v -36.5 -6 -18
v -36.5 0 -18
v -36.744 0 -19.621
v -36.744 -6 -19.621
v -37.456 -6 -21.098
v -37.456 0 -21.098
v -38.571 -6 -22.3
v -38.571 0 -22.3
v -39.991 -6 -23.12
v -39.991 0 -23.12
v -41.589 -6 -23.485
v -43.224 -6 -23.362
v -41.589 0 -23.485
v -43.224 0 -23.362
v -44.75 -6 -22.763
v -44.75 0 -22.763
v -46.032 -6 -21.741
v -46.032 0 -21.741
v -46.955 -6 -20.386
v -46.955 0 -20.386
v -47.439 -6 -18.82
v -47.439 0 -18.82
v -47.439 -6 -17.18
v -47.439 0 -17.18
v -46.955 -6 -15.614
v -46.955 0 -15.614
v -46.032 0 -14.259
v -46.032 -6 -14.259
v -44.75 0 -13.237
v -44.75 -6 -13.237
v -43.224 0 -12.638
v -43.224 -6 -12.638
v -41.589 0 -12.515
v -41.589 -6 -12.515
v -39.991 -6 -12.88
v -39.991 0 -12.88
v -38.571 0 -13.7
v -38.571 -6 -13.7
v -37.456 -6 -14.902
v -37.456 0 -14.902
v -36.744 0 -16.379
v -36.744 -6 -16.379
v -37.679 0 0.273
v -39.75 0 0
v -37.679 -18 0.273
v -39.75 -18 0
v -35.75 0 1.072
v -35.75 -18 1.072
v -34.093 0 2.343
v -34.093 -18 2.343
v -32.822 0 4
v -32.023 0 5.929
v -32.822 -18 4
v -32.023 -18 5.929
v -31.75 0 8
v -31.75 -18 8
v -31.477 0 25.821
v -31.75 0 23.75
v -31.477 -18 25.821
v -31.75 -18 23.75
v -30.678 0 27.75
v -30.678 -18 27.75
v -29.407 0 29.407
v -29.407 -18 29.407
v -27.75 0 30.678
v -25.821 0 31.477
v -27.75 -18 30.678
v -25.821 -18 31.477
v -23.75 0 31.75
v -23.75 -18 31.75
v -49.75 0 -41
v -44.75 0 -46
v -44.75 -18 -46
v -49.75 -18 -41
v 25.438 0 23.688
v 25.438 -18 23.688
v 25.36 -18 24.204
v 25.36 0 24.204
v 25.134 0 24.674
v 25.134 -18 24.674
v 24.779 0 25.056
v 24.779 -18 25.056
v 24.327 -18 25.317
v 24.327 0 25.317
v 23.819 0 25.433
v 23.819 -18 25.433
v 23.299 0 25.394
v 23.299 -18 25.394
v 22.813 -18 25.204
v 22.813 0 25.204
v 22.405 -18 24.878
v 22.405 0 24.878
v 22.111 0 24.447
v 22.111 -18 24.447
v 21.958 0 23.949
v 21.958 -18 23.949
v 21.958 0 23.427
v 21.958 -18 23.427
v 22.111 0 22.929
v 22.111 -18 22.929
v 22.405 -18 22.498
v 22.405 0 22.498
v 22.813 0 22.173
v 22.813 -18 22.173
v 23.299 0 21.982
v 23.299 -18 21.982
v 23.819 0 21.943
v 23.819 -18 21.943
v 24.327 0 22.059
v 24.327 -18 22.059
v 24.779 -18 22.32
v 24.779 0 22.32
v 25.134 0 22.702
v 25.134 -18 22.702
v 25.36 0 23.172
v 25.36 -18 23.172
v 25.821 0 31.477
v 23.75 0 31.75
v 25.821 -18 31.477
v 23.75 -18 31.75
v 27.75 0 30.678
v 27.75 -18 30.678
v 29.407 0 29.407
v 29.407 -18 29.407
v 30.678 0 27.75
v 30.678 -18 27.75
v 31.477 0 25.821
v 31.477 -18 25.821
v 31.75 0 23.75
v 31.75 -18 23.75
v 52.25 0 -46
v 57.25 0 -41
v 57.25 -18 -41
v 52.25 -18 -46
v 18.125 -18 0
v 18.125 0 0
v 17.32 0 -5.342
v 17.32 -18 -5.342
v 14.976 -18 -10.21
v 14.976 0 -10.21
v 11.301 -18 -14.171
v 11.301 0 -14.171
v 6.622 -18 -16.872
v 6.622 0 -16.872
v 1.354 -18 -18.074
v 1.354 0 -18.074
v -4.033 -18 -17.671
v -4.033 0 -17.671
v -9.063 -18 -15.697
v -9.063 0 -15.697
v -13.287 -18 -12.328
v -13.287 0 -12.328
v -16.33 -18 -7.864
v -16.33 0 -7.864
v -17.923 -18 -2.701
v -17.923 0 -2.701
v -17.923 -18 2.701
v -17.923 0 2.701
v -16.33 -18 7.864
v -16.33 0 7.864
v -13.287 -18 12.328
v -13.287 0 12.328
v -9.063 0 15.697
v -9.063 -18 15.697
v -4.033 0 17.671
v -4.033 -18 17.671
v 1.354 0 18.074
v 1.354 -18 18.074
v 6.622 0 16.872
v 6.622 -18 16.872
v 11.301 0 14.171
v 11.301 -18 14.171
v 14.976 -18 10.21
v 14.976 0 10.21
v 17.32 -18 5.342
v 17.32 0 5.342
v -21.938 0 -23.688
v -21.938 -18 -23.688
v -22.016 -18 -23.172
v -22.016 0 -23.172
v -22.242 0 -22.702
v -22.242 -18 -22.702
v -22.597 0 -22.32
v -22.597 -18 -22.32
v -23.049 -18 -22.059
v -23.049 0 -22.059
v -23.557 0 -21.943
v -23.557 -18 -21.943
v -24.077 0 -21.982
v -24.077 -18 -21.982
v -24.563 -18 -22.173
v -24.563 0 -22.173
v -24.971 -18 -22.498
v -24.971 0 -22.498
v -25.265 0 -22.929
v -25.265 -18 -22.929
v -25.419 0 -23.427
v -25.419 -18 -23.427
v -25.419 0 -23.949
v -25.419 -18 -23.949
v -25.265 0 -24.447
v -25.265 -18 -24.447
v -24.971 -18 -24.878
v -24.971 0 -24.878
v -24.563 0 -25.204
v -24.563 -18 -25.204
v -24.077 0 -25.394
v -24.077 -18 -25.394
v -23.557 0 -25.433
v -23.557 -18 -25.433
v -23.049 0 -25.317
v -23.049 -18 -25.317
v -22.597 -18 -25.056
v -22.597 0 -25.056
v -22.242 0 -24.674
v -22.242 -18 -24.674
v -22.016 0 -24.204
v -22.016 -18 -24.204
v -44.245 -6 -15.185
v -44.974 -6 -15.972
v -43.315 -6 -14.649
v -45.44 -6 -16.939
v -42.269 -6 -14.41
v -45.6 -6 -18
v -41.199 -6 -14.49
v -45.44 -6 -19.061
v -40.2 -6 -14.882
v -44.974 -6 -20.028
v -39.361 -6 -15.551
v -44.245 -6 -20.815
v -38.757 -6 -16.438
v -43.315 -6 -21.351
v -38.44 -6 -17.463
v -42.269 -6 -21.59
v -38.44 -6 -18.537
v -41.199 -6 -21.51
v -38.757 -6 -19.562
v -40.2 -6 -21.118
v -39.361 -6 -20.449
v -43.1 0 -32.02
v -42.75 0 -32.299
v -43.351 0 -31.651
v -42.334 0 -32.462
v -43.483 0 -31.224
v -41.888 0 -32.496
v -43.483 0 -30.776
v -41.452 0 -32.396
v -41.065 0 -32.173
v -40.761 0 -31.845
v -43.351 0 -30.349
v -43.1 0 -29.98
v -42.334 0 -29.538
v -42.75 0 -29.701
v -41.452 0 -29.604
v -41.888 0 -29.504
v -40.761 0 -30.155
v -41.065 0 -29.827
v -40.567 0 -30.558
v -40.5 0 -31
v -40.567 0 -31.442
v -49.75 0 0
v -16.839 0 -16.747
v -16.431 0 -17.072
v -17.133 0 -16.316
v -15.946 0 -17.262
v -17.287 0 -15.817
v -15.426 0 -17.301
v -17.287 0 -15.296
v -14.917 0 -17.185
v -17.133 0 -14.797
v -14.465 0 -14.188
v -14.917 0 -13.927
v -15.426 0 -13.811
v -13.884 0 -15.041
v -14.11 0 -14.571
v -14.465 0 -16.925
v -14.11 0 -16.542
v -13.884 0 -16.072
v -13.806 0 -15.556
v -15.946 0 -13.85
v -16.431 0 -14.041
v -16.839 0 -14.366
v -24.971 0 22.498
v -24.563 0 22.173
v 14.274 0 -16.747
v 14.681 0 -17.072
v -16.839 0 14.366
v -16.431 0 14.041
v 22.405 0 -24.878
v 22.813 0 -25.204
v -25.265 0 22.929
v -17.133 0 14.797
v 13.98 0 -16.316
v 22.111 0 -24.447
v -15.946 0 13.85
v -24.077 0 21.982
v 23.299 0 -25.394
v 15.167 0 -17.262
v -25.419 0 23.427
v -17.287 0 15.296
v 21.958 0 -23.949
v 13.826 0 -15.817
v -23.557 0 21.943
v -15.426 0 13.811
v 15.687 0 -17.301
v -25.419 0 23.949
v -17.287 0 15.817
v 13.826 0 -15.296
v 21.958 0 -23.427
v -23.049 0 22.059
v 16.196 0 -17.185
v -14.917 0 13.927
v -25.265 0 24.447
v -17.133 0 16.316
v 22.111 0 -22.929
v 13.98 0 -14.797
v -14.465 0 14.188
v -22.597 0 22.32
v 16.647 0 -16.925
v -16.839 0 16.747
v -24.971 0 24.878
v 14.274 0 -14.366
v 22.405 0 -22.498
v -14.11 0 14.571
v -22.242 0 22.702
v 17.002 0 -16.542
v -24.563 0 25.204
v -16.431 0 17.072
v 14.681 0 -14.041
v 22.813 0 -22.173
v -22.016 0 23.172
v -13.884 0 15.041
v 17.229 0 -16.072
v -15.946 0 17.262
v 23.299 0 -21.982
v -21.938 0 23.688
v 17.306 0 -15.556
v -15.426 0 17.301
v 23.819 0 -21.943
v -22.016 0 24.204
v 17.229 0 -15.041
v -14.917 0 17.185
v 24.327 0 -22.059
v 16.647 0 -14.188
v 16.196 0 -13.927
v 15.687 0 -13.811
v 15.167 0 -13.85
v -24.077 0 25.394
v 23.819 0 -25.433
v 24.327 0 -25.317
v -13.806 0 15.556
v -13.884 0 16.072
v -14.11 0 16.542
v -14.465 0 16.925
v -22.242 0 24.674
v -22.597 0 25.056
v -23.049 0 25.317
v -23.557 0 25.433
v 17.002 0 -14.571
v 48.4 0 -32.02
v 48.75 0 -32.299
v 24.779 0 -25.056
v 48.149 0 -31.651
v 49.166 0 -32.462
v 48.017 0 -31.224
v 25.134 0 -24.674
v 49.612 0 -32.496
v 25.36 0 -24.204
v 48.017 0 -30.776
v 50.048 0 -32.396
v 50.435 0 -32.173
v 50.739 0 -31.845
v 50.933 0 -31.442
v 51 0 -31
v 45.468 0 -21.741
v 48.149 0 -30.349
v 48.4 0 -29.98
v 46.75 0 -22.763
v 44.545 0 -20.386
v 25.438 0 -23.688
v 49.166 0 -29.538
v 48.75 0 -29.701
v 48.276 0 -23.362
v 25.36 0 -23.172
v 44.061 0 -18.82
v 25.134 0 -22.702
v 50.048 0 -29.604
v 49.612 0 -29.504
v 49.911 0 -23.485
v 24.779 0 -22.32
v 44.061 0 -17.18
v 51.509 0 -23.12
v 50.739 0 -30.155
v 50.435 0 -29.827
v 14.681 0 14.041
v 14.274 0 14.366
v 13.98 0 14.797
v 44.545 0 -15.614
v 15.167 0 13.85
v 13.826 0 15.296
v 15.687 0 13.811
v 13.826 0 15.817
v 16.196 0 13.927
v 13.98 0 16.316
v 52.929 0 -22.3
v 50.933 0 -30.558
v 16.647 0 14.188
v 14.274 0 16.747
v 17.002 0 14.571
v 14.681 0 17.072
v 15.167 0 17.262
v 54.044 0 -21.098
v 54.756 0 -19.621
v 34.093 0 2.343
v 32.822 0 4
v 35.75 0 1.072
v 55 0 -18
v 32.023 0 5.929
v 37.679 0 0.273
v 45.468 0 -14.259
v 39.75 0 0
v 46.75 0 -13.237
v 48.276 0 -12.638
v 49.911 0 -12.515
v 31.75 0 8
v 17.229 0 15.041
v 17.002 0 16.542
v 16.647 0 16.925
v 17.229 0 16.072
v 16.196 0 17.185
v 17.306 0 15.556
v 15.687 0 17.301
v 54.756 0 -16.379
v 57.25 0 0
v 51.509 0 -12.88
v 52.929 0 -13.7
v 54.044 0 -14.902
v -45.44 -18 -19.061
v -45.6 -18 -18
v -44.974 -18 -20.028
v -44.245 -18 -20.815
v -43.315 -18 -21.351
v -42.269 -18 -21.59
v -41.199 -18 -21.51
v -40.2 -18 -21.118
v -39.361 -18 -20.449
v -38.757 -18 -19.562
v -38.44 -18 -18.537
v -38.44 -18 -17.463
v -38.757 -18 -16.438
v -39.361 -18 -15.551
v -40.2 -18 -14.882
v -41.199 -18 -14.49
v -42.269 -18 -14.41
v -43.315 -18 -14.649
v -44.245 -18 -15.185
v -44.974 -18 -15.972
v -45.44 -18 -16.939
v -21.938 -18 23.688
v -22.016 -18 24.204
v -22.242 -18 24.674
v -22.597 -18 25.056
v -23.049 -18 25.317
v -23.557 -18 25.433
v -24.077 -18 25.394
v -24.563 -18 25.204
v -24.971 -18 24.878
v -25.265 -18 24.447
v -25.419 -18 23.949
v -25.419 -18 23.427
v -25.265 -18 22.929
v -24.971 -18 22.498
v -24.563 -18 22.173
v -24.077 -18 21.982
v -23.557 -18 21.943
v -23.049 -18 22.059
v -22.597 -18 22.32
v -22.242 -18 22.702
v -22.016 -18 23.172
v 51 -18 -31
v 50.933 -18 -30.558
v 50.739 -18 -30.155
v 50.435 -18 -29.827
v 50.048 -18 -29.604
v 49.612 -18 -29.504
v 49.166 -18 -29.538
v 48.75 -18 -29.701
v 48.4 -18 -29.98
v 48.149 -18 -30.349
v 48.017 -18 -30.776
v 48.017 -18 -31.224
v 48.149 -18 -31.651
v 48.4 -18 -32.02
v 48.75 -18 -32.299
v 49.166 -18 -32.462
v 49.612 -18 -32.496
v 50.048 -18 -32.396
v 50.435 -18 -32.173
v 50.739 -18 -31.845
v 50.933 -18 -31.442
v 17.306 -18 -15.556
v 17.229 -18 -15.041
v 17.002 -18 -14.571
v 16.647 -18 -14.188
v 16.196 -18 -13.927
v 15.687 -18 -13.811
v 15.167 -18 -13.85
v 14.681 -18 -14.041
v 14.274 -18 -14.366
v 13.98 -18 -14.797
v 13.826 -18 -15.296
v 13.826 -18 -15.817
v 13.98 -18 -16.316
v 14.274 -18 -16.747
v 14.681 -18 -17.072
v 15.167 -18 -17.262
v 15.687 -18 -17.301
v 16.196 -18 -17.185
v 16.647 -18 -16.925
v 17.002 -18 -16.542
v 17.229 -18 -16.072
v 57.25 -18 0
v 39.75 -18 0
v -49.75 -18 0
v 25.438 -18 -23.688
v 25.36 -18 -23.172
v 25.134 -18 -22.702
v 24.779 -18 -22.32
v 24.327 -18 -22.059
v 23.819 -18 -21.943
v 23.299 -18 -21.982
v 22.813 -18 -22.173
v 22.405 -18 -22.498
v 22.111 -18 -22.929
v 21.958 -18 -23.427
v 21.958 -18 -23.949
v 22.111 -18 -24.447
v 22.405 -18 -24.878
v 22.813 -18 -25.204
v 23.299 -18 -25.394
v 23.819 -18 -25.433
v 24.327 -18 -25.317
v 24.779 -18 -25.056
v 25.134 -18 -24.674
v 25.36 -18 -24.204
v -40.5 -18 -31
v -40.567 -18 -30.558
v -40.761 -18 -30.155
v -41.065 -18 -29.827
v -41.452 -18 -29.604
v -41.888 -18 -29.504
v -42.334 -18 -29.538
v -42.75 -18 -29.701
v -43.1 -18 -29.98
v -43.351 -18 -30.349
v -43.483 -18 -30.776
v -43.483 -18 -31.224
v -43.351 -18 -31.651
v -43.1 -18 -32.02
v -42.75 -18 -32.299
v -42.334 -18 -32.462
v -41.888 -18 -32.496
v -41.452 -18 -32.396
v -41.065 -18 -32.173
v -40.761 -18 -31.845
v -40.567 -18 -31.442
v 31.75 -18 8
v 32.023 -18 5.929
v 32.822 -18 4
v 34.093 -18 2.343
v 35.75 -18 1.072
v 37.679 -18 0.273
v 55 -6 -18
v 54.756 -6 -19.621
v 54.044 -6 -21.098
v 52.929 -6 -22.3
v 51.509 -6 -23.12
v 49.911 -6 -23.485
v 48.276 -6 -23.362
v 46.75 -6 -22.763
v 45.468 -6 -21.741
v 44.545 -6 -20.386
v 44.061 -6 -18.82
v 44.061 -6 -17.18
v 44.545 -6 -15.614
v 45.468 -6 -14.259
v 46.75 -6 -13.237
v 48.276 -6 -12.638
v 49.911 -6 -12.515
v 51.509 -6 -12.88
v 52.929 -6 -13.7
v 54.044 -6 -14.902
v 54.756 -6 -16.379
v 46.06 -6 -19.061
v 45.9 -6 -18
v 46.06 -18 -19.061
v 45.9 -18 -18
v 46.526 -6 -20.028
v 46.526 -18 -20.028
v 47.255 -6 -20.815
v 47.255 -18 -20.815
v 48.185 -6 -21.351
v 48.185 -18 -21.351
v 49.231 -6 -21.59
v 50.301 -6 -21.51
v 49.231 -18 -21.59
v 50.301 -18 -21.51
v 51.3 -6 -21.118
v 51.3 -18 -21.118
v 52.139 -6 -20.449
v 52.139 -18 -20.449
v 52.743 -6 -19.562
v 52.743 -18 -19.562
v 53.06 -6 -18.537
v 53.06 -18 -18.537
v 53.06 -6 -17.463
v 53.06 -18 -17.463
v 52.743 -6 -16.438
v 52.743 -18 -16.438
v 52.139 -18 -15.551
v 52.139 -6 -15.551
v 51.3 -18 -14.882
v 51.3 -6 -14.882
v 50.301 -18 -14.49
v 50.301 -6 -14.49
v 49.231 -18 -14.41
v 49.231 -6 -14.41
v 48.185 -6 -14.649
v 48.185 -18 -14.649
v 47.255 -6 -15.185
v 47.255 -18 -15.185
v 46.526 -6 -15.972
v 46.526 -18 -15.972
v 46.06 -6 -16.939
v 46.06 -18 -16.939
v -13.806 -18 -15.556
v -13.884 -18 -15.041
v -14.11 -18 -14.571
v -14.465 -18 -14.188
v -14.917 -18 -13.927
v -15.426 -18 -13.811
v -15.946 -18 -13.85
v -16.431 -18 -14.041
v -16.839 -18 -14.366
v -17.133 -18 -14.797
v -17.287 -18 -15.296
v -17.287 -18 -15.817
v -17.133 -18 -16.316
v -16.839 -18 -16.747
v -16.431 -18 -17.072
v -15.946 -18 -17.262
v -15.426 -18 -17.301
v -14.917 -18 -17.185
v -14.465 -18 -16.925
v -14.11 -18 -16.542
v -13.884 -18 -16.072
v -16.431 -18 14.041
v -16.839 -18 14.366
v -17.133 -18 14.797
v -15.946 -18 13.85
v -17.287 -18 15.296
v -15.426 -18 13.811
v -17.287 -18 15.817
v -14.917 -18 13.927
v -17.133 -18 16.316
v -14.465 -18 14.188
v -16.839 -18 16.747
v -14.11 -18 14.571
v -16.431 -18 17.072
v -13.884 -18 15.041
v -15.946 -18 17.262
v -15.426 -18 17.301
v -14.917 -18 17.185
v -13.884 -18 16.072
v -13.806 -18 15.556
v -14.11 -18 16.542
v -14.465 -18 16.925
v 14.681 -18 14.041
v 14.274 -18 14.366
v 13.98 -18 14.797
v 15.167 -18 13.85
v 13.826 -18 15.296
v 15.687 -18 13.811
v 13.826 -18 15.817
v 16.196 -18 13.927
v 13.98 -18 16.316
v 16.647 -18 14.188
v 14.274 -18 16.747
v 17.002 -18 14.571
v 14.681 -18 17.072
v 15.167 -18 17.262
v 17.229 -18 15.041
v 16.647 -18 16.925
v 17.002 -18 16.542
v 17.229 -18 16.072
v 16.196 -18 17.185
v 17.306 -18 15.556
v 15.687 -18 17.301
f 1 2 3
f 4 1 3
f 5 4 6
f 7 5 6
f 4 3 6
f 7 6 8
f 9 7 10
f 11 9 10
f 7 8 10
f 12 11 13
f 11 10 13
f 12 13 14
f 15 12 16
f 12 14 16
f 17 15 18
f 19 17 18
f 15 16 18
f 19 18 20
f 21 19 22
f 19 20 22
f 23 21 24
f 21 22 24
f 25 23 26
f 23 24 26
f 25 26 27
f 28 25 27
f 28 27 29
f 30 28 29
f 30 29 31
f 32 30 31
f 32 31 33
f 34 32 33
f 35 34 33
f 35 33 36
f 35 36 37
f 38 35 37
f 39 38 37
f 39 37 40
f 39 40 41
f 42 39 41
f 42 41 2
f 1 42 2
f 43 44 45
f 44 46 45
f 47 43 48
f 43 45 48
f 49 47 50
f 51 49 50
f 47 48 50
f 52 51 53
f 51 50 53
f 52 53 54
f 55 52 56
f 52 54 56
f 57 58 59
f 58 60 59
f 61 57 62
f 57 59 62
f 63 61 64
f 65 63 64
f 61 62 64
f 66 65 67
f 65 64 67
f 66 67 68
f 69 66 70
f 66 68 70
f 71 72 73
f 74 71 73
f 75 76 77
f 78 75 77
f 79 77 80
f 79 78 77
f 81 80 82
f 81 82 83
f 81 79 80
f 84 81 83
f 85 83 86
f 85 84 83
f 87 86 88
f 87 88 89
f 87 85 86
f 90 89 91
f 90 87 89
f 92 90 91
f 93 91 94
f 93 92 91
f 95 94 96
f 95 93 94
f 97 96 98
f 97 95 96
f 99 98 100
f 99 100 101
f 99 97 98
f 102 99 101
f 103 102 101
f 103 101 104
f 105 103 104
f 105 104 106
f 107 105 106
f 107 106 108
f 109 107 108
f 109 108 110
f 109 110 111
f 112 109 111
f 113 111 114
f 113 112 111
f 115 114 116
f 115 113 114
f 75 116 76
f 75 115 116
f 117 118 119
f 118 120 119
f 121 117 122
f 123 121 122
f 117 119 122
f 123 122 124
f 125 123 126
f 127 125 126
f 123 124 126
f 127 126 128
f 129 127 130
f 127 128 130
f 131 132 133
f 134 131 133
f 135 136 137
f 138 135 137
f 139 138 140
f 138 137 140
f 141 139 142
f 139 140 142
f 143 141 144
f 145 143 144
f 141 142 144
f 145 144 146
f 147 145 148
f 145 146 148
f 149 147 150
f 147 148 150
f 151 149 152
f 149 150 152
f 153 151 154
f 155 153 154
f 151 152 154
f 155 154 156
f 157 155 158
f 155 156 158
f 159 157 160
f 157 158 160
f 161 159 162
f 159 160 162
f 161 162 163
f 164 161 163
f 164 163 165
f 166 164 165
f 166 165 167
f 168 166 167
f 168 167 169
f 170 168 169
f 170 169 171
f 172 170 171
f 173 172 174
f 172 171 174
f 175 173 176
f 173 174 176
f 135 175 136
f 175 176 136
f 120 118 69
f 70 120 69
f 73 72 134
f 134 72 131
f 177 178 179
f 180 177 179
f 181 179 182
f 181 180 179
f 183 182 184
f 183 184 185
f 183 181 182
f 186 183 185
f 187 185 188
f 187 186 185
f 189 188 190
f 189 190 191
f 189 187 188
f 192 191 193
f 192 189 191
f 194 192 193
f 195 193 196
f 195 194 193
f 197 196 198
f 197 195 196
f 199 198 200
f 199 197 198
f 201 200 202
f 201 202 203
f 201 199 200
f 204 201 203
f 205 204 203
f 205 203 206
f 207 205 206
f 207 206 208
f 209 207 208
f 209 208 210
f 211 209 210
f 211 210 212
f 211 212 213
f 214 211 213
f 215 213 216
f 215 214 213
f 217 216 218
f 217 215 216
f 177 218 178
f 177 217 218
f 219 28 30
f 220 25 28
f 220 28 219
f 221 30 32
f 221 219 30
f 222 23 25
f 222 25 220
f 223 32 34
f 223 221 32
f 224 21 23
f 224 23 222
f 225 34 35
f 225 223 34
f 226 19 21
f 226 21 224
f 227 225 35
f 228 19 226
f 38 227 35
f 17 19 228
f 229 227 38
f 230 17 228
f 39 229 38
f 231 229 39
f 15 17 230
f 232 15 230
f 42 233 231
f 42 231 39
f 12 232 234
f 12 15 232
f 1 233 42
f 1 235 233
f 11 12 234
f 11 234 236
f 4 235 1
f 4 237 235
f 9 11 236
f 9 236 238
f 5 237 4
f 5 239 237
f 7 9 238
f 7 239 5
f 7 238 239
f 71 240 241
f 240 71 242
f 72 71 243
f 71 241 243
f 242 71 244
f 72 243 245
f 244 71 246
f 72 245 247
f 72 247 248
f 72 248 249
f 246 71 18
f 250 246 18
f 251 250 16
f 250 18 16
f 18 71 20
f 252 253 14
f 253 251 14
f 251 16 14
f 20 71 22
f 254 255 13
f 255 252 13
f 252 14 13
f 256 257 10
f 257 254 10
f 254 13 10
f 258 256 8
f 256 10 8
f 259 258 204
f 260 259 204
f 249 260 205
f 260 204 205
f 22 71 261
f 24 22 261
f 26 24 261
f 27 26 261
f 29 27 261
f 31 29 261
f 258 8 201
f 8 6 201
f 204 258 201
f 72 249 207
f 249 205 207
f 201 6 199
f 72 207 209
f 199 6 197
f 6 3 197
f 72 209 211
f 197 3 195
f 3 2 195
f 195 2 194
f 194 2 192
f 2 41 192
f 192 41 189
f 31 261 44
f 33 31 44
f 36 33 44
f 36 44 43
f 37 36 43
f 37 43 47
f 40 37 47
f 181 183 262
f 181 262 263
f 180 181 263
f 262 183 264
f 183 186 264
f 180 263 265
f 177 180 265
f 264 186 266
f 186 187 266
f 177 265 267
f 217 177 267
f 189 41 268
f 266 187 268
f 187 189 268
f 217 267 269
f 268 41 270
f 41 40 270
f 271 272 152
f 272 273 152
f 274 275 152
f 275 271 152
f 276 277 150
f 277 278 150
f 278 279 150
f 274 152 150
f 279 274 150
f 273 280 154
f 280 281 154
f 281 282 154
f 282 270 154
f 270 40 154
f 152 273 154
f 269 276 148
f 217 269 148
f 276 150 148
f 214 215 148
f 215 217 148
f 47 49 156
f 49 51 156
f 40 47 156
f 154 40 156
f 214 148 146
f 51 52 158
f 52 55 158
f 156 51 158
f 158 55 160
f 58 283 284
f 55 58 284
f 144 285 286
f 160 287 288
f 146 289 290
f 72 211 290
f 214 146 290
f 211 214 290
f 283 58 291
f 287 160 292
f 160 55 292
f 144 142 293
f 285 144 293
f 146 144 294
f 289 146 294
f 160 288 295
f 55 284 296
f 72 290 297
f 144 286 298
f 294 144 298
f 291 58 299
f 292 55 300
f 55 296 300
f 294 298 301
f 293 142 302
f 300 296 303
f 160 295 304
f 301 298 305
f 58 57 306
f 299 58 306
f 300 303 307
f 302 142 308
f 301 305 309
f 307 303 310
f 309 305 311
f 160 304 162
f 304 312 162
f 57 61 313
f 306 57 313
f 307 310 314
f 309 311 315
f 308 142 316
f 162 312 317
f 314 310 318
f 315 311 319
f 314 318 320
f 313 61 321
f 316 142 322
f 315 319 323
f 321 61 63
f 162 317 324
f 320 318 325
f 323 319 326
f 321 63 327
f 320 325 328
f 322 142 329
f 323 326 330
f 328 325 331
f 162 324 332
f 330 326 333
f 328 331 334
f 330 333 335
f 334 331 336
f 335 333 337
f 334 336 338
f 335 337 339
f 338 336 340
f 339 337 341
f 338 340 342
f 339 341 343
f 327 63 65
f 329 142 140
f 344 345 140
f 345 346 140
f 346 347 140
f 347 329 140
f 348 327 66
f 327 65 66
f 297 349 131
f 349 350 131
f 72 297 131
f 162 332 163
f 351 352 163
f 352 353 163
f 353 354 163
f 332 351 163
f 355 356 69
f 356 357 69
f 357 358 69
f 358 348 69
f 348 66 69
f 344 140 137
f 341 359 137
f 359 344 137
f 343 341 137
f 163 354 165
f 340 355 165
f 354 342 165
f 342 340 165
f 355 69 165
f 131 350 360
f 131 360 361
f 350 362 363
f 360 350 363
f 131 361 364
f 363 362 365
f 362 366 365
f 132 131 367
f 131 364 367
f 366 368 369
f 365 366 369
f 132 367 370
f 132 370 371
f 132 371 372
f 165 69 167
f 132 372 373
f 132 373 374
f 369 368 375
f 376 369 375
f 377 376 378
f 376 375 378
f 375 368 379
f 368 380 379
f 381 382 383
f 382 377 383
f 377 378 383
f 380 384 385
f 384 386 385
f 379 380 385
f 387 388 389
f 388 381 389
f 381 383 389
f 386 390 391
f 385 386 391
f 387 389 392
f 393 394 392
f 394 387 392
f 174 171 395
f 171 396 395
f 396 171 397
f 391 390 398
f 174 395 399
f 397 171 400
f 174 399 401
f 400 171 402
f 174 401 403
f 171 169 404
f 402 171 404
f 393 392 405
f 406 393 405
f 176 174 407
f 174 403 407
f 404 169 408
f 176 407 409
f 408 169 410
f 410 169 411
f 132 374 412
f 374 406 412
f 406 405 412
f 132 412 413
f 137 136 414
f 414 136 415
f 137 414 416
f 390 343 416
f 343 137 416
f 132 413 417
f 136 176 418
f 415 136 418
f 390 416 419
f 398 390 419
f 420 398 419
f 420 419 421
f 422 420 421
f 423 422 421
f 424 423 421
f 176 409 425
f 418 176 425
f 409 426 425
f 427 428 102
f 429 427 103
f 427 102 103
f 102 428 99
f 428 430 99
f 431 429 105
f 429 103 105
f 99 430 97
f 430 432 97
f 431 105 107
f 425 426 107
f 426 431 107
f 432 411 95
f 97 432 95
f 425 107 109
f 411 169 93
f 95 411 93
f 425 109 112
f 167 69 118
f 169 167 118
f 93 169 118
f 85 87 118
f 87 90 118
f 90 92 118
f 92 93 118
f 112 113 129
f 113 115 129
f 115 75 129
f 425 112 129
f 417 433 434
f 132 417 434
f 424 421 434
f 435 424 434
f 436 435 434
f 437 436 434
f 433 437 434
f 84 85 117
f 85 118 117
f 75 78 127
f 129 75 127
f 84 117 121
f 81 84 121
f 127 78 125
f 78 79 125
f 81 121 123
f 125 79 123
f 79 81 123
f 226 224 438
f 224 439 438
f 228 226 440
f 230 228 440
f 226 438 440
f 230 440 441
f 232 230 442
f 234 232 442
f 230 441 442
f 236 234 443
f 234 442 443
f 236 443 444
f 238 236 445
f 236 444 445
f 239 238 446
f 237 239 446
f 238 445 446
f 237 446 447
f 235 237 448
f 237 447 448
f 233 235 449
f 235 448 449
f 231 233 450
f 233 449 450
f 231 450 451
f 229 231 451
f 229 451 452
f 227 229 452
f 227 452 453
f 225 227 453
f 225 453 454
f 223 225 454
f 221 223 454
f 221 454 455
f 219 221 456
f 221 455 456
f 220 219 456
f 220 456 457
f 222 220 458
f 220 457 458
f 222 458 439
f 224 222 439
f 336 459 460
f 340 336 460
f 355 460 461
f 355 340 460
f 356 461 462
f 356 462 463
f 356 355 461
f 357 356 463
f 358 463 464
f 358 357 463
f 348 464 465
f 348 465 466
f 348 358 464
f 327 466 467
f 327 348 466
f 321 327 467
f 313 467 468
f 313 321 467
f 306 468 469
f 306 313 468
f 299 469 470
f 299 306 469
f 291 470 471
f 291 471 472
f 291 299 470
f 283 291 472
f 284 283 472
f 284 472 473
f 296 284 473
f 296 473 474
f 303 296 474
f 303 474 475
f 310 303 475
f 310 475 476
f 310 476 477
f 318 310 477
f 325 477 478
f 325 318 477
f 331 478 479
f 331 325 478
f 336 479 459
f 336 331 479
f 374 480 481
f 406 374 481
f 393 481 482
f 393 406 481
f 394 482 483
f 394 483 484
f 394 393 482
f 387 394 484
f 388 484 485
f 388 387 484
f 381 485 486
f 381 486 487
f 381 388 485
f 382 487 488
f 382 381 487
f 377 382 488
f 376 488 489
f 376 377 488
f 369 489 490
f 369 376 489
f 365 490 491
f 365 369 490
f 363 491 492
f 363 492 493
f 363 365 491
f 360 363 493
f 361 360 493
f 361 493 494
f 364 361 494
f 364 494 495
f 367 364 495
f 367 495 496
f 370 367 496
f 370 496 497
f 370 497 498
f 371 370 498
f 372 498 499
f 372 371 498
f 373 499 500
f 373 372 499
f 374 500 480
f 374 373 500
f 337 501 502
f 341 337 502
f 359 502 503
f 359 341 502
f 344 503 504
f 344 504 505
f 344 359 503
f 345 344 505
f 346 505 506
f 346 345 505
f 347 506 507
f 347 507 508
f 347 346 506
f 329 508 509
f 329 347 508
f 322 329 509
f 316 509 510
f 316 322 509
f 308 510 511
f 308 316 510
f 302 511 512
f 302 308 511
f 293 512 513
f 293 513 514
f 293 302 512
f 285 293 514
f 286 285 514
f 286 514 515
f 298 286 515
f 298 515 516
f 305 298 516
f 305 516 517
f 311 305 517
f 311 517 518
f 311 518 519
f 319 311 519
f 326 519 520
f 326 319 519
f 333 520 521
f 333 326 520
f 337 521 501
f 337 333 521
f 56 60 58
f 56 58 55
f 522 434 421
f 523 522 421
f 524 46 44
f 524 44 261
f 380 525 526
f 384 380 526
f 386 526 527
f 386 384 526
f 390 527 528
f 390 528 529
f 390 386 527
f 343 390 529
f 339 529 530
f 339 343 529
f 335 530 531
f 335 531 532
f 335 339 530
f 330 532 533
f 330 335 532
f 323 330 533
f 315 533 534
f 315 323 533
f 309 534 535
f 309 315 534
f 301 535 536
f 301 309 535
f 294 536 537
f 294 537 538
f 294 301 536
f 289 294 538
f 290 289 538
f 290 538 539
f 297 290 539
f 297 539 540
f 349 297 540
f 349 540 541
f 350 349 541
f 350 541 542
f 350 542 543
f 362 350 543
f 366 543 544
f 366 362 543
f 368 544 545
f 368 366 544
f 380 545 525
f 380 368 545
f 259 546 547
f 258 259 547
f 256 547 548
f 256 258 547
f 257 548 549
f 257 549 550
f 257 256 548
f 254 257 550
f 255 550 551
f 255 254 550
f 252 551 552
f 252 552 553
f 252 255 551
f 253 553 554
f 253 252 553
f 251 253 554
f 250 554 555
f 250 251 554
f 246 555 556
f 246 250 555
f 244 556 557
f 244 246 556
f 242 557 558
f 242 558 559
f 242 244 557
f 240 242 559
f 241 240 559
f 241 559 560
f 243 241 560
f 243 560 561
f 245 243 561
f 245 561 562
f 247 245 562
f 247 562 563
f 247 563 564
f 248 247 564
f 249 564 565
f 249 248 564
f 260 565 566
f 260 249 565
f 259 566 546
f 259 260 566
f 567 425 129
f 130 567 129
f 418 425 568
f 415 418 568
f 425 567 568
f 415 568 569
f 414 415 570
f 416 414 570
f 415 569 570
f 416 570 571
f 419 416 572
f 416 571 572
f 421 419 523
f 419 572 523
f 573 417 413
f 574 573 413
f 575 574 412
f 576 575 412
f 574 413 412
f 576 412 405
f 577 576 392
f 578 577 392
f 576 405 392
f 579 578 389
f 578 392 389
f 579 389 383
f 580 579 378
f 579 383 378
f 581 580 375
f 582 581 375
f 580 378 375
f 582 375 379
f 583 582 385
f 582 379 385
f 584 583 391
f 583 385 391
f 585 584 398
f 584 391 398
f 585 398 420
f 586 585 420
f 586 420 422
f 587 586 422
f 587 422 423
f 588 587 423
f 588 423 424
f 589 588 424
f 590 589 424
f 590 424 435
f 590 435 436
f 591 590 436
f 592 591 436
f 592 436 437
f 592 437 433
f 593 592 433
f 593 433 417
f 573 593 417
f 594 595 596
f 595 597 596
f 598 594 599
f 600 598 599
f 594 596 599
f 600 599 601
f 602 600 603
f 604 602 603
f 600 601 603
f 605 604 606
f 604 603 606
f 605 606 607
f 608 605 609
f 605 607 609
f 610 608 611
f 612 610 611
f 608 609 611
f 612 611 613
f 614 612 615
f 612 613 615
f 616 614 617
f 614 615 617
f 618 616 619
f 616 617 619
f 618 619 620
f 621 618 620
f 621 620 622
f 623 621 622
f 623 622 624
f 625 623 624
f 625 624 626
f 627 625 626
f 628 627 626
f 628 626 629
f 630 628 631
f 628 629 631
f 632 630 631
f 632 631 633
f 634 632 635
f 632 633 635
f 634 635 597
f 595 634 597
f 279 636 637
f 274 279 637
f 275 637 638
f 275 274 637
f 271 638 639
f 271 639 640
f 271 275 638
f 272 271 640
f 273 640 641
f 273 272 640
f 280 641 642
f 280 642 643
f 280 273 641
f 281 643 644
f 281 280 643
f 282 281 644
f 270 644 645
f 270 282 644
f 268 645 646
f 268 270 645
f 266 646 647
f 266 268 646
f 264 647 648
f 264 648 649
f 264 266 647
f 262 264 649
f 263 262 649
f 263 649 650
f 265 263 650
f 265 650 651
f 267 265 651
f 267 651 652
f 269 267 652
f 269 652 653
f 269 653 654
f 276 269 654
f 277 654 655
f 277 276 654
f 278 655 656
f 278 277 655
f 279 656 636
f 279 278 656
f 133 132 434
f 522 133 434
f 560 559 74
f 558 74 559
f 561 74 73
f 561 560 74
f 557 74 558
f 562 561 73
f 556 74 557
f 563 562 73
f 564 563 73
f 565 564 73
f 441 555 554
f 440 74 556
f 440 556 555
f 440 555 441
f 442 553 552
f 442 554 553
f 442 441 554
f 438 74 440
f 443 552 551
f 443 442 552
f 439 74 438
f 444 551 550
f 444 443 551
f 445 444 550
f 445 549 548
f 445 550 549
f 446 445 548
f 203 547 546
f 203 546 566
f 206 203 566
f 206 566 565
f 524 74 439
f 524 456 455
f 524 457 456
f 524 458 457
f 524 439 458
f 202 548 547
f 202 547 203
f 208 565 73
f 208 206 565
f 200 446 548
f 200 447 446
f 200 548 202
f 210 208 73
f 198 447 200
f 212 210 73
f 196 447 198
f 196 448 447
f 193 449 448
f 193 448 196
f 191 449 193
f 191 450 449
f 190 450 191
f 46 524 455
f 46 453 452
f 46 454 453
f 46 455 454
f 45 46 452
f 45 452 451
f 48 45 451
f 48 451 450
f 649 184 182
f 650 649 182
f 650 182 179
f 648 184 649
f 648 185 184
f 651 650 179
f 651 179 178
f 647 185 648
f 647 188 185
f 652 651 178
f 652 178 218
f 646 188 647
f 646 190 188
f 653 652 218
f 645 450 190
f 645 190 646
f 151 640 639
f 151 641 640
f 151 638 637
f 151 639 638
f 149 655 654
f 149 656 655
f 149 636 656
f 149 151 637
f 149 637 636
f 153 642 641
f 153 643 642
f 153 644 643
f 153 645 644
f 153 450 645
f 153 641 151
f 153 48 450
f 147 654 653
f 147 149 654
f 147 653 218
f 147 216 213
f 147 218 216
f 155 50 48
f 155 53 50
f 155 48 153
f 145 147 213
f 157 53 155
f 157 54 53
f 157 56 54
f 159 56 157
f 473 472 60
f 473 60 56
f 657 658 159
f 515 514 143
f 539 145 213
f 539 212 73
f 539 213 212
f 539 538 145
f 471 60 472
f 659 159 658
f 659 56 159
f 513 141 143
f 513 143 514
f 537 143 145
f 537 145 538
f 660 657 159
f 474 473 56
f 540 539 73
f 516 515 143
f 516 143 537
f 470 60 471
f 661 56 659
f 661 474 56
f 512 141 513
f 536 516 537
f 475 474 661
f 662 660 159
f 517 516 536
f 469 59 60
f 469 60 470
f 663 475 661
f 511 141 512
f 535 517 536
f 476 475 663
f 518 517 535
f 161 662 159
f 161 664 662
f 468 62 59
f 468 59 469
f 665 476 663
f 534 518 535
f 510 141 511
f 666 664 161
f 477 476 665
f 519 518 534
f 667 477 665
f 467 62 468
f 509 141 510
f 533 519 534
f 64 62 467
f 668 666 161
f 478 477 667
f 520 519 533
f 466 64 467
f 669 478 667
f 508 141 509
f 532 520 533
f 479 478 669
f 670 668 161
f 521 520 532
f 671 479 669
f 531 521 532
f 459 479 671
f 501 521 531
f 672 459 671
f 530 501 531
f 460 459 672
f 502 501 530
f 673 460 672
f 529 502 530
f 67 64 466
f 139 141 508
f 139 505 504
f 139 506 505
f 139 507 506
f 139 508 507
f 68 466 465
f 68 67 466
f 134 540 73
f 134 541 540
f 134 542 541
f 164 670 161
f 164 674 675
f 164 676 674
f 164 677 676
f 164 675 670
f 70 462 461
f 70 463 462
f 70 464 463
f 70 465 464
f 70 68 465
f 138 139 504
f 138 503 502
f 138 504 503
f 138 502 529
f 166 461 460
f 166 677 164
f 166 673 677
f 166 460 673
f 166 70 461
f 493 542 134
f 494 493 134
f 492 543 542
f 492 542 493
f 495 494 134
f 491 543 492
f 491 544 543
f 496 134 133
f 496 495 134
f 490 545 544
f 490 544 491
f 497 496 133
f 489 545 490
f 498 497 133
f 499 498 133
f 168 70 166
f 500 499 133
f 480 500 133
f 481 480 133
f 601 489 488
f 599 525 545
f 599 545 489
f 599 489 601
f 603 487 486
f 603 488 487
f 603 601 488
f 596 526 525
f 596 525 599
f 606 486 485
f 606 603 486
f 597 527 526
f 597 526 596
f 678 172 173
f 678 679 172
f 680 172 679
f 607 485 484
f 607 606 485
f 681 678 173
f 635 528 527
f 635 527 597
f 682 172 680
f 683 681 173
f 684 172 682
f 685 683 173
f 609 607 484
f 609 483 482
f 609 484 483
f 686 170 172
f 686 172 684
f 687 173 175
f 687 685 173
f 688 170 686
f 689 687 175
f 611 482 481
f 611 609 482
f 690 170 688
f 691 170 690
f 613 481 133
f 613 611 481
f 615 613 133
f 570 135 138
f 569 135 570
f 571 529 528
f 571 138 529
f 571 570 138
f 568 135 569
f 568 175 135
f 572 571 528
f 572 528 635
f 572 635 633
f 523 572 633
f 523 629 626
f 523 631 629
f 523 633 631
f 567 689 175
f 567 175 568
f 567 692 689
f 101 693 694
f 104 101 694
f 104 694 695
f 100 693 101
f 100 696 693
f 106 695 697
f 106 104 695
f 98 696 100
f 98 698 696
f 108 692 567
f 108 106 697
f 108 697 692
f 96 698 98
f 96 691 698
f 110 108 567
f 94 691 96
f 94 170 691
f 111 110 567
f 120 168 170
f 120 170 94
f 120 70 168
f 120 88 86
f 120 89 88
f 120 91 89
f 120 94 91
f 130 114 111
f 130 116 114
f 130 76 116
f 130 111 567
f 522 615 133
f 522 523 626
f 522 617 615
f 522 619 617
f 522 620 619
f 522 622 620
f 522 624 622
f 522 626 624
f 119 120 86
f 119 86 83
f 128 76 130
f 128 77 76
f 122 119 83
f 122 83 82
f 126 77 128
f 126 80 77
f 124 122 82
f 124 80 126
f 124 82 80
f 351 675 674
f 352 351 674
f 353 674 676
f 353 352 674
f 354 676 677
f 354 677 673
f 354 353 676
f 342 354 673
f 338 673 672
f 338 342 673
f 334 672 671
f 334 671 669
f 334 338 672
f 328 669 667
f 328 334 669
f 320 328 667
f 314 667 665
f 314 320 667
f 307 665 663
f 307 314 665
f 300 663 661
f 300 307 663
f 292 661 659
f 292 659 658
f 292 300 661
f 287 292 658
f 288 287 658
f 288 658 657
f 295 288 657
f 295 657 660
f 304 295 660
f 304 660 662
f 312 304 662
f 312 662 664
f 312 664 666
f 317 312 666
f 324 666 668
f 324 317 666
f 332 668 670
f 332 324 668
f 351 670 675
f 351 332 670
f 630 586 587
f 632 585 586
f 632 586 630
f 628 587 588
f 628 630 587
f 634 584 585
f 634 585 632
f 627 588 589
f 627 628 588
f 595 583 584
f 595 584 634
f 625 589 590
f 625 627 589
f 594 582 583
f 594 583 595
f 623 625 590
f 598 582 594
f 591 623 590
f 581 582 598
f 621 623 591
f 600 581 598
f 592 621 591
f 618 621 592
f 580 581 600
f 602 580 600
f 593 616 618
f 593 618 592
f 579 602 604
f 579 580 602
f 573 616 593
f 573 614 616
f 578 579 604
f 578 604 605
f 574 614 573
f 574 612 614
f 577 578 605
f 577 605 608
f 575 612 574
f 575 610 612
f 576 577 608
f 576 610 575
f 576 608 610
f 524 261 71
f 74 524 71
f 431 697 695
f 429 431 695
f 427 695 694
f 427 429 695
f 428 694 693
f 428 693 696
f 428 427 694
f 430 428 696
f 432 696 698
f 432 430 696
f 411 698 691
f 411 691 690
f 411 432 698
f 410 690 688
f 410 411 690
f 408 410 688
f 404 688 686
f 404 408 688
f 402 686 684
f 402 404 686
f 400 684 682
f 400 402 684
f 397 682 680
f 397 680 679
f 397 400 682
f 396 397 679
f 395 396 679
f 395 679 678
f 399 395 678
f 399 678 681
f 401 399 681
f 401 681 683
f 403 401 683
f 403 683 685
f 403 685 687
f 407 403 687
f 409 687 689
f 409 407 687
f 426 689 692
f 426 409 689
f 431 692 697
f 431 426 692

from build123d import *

# Parameters (mm, degrees)
F0_R           = 1.75
F0_R_2         = 1.5
F1_DEPTH       = 18
F2_SIZE        = 5
F3_R           = 8
F4_D           = 7.2
F4_DEPTH       = 35
F4_CBORE_D     = 11
F4_CBORE_DEPTH = 6
F4_TIP         = 2.1630982285


# Not quite as in the source:
# - a feature names something its author has since deleted; it is built from what else it names


with BuildPart() as f1:
    # F0 (on Front) → F1 (new body)
    with BuildSketch(Plane.XZ):
        with BuildLine():
            ThreePointArc((-18.125, 0), (0, 18.125), (18.125, 0))
            Line((18.125, 0), (31.75, 0))
            Line((31.75, 0), (31.75, 31.75))
            Line((31.75, 31.75), (-31.75, 31.75))
            Line((-31.75, 31.75), (-31.75, 0))
            Line((-31.75, 0), (-18.125, 0))
        make_face()
        with Locations((-23.6880771697, 23.6880771697)):
            Circle(F0_R, mode=Mode.SUBTRACT)
        with Locations((-15.5563491861, 15.5563491861)):
            Circle(F0_R, mode=Mode.SUBTRACT)
        with Locations((15.5563491861, 15.5563491861)):
            Circle(F0_R, mode=Mode.SUBTRACT)
        with Locations((23.6880771697, 23.6880771697)):
            Circle(F0_R, mode=Mode.SUBTRACT)
        with BuildLine():
            Line((31.75, 0), (18.125, 0))
            ThreePointArc((18.125, 0), (0, -18.125), (-18.125, 0))
            Line((-18.125, 0), (-31.75, 0))
            Line((-31.75, 0), (-31.75, -31.75))
            Line((-31.75, -31.75), (31.75, -31.75))
            Line((31.75, -31.75), (31.75, 0))
        make_face()
        with Locations((-23.6880771697, -23.6880771697)):
            Circle(F0_R, mode=Mode.SUBTRACT)
        with Locations((-15.5563491861, -15.5563491861)):
            Circle(F0_R, mode=Mode.SUBTRACT)
        with Locations((23.6880771697, -23.6880771697)):
            Circle(F0_R, mode=Mode.SUBTRACT)
        with Locations((15.5563491861, -15.5563491861)):
            Circle(F0_R, mode=Mode.SUBTRACT)
        Polygon((57.25, 0), (31.75, 0), (31.75, -31.75), (-31.75, -31.75), (-31.75, 0), (-49.75, 0), (-49.75, -46), (57.25, -46), align=None)
        with Locations((-42, -31)):
            Circle(F0_R_2, mode=Mode.SUBTRACT)
        with Locations((49.5, -31)):
            Circle(F0_R_2, mode=Mode.SUBTRACT)
    extrude(amount=F1_DEPTH)

    # F2
    f2_edges = [f1.edges().sort_by_distance(p)[0] for p in [
        (-49.75, -9, -46),
        (57.25, -9, -46),
    ]]
    chamfer(f2_edges, length=F2_SIZE)

    # F3
    f3_edges = [f1.edges().sort_by_distance(p)[0] for p in [
        (-31.75, -9, 0),
        (-31.75, -9, 31.75),
        (31.75, -9, 31.75),
        (31.75, -9, 0),
    ]]
    fillet(f3_edges, radius=F3_R)

    # F4
    with Locations(Plane(origin=(0, 0, 0), x_dir=(1, 0, 0), z_dir=(0, 1, 0))):
        with Locations((49.5, 18), (-42, 18)):
            CounterBoreHole(F4_D / 2, F4_CBORE_D / 2, F4_CBORE_DEPTH, depth=F4_DEPTH)
            with Locations((0, 0, -(F4_DEPTH + F4_TIP / 2))):  # 118° drill point
                Cone(0, F4_D / 2, F4_TIP, mode=Mode.SUBTRACT)


solid = f1.part
